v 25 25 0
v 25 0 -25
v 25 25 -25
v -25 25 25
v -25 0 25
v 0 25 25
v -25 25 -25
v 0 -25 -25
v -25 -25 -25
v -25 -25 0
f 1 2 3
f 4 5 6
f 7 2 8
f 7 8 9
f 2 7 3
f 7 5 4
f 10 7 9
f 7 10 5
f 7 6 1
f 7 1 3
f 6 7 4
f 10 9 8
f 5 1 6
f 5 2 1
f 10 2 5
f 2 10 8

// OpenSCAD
difference(){
cube([50,50,50],center=true);
rotate([0,0,45])
rotate([atan(sqrt(2)),0,0])    
translate([-50,-50,0])cube([100,100,100]);
}
